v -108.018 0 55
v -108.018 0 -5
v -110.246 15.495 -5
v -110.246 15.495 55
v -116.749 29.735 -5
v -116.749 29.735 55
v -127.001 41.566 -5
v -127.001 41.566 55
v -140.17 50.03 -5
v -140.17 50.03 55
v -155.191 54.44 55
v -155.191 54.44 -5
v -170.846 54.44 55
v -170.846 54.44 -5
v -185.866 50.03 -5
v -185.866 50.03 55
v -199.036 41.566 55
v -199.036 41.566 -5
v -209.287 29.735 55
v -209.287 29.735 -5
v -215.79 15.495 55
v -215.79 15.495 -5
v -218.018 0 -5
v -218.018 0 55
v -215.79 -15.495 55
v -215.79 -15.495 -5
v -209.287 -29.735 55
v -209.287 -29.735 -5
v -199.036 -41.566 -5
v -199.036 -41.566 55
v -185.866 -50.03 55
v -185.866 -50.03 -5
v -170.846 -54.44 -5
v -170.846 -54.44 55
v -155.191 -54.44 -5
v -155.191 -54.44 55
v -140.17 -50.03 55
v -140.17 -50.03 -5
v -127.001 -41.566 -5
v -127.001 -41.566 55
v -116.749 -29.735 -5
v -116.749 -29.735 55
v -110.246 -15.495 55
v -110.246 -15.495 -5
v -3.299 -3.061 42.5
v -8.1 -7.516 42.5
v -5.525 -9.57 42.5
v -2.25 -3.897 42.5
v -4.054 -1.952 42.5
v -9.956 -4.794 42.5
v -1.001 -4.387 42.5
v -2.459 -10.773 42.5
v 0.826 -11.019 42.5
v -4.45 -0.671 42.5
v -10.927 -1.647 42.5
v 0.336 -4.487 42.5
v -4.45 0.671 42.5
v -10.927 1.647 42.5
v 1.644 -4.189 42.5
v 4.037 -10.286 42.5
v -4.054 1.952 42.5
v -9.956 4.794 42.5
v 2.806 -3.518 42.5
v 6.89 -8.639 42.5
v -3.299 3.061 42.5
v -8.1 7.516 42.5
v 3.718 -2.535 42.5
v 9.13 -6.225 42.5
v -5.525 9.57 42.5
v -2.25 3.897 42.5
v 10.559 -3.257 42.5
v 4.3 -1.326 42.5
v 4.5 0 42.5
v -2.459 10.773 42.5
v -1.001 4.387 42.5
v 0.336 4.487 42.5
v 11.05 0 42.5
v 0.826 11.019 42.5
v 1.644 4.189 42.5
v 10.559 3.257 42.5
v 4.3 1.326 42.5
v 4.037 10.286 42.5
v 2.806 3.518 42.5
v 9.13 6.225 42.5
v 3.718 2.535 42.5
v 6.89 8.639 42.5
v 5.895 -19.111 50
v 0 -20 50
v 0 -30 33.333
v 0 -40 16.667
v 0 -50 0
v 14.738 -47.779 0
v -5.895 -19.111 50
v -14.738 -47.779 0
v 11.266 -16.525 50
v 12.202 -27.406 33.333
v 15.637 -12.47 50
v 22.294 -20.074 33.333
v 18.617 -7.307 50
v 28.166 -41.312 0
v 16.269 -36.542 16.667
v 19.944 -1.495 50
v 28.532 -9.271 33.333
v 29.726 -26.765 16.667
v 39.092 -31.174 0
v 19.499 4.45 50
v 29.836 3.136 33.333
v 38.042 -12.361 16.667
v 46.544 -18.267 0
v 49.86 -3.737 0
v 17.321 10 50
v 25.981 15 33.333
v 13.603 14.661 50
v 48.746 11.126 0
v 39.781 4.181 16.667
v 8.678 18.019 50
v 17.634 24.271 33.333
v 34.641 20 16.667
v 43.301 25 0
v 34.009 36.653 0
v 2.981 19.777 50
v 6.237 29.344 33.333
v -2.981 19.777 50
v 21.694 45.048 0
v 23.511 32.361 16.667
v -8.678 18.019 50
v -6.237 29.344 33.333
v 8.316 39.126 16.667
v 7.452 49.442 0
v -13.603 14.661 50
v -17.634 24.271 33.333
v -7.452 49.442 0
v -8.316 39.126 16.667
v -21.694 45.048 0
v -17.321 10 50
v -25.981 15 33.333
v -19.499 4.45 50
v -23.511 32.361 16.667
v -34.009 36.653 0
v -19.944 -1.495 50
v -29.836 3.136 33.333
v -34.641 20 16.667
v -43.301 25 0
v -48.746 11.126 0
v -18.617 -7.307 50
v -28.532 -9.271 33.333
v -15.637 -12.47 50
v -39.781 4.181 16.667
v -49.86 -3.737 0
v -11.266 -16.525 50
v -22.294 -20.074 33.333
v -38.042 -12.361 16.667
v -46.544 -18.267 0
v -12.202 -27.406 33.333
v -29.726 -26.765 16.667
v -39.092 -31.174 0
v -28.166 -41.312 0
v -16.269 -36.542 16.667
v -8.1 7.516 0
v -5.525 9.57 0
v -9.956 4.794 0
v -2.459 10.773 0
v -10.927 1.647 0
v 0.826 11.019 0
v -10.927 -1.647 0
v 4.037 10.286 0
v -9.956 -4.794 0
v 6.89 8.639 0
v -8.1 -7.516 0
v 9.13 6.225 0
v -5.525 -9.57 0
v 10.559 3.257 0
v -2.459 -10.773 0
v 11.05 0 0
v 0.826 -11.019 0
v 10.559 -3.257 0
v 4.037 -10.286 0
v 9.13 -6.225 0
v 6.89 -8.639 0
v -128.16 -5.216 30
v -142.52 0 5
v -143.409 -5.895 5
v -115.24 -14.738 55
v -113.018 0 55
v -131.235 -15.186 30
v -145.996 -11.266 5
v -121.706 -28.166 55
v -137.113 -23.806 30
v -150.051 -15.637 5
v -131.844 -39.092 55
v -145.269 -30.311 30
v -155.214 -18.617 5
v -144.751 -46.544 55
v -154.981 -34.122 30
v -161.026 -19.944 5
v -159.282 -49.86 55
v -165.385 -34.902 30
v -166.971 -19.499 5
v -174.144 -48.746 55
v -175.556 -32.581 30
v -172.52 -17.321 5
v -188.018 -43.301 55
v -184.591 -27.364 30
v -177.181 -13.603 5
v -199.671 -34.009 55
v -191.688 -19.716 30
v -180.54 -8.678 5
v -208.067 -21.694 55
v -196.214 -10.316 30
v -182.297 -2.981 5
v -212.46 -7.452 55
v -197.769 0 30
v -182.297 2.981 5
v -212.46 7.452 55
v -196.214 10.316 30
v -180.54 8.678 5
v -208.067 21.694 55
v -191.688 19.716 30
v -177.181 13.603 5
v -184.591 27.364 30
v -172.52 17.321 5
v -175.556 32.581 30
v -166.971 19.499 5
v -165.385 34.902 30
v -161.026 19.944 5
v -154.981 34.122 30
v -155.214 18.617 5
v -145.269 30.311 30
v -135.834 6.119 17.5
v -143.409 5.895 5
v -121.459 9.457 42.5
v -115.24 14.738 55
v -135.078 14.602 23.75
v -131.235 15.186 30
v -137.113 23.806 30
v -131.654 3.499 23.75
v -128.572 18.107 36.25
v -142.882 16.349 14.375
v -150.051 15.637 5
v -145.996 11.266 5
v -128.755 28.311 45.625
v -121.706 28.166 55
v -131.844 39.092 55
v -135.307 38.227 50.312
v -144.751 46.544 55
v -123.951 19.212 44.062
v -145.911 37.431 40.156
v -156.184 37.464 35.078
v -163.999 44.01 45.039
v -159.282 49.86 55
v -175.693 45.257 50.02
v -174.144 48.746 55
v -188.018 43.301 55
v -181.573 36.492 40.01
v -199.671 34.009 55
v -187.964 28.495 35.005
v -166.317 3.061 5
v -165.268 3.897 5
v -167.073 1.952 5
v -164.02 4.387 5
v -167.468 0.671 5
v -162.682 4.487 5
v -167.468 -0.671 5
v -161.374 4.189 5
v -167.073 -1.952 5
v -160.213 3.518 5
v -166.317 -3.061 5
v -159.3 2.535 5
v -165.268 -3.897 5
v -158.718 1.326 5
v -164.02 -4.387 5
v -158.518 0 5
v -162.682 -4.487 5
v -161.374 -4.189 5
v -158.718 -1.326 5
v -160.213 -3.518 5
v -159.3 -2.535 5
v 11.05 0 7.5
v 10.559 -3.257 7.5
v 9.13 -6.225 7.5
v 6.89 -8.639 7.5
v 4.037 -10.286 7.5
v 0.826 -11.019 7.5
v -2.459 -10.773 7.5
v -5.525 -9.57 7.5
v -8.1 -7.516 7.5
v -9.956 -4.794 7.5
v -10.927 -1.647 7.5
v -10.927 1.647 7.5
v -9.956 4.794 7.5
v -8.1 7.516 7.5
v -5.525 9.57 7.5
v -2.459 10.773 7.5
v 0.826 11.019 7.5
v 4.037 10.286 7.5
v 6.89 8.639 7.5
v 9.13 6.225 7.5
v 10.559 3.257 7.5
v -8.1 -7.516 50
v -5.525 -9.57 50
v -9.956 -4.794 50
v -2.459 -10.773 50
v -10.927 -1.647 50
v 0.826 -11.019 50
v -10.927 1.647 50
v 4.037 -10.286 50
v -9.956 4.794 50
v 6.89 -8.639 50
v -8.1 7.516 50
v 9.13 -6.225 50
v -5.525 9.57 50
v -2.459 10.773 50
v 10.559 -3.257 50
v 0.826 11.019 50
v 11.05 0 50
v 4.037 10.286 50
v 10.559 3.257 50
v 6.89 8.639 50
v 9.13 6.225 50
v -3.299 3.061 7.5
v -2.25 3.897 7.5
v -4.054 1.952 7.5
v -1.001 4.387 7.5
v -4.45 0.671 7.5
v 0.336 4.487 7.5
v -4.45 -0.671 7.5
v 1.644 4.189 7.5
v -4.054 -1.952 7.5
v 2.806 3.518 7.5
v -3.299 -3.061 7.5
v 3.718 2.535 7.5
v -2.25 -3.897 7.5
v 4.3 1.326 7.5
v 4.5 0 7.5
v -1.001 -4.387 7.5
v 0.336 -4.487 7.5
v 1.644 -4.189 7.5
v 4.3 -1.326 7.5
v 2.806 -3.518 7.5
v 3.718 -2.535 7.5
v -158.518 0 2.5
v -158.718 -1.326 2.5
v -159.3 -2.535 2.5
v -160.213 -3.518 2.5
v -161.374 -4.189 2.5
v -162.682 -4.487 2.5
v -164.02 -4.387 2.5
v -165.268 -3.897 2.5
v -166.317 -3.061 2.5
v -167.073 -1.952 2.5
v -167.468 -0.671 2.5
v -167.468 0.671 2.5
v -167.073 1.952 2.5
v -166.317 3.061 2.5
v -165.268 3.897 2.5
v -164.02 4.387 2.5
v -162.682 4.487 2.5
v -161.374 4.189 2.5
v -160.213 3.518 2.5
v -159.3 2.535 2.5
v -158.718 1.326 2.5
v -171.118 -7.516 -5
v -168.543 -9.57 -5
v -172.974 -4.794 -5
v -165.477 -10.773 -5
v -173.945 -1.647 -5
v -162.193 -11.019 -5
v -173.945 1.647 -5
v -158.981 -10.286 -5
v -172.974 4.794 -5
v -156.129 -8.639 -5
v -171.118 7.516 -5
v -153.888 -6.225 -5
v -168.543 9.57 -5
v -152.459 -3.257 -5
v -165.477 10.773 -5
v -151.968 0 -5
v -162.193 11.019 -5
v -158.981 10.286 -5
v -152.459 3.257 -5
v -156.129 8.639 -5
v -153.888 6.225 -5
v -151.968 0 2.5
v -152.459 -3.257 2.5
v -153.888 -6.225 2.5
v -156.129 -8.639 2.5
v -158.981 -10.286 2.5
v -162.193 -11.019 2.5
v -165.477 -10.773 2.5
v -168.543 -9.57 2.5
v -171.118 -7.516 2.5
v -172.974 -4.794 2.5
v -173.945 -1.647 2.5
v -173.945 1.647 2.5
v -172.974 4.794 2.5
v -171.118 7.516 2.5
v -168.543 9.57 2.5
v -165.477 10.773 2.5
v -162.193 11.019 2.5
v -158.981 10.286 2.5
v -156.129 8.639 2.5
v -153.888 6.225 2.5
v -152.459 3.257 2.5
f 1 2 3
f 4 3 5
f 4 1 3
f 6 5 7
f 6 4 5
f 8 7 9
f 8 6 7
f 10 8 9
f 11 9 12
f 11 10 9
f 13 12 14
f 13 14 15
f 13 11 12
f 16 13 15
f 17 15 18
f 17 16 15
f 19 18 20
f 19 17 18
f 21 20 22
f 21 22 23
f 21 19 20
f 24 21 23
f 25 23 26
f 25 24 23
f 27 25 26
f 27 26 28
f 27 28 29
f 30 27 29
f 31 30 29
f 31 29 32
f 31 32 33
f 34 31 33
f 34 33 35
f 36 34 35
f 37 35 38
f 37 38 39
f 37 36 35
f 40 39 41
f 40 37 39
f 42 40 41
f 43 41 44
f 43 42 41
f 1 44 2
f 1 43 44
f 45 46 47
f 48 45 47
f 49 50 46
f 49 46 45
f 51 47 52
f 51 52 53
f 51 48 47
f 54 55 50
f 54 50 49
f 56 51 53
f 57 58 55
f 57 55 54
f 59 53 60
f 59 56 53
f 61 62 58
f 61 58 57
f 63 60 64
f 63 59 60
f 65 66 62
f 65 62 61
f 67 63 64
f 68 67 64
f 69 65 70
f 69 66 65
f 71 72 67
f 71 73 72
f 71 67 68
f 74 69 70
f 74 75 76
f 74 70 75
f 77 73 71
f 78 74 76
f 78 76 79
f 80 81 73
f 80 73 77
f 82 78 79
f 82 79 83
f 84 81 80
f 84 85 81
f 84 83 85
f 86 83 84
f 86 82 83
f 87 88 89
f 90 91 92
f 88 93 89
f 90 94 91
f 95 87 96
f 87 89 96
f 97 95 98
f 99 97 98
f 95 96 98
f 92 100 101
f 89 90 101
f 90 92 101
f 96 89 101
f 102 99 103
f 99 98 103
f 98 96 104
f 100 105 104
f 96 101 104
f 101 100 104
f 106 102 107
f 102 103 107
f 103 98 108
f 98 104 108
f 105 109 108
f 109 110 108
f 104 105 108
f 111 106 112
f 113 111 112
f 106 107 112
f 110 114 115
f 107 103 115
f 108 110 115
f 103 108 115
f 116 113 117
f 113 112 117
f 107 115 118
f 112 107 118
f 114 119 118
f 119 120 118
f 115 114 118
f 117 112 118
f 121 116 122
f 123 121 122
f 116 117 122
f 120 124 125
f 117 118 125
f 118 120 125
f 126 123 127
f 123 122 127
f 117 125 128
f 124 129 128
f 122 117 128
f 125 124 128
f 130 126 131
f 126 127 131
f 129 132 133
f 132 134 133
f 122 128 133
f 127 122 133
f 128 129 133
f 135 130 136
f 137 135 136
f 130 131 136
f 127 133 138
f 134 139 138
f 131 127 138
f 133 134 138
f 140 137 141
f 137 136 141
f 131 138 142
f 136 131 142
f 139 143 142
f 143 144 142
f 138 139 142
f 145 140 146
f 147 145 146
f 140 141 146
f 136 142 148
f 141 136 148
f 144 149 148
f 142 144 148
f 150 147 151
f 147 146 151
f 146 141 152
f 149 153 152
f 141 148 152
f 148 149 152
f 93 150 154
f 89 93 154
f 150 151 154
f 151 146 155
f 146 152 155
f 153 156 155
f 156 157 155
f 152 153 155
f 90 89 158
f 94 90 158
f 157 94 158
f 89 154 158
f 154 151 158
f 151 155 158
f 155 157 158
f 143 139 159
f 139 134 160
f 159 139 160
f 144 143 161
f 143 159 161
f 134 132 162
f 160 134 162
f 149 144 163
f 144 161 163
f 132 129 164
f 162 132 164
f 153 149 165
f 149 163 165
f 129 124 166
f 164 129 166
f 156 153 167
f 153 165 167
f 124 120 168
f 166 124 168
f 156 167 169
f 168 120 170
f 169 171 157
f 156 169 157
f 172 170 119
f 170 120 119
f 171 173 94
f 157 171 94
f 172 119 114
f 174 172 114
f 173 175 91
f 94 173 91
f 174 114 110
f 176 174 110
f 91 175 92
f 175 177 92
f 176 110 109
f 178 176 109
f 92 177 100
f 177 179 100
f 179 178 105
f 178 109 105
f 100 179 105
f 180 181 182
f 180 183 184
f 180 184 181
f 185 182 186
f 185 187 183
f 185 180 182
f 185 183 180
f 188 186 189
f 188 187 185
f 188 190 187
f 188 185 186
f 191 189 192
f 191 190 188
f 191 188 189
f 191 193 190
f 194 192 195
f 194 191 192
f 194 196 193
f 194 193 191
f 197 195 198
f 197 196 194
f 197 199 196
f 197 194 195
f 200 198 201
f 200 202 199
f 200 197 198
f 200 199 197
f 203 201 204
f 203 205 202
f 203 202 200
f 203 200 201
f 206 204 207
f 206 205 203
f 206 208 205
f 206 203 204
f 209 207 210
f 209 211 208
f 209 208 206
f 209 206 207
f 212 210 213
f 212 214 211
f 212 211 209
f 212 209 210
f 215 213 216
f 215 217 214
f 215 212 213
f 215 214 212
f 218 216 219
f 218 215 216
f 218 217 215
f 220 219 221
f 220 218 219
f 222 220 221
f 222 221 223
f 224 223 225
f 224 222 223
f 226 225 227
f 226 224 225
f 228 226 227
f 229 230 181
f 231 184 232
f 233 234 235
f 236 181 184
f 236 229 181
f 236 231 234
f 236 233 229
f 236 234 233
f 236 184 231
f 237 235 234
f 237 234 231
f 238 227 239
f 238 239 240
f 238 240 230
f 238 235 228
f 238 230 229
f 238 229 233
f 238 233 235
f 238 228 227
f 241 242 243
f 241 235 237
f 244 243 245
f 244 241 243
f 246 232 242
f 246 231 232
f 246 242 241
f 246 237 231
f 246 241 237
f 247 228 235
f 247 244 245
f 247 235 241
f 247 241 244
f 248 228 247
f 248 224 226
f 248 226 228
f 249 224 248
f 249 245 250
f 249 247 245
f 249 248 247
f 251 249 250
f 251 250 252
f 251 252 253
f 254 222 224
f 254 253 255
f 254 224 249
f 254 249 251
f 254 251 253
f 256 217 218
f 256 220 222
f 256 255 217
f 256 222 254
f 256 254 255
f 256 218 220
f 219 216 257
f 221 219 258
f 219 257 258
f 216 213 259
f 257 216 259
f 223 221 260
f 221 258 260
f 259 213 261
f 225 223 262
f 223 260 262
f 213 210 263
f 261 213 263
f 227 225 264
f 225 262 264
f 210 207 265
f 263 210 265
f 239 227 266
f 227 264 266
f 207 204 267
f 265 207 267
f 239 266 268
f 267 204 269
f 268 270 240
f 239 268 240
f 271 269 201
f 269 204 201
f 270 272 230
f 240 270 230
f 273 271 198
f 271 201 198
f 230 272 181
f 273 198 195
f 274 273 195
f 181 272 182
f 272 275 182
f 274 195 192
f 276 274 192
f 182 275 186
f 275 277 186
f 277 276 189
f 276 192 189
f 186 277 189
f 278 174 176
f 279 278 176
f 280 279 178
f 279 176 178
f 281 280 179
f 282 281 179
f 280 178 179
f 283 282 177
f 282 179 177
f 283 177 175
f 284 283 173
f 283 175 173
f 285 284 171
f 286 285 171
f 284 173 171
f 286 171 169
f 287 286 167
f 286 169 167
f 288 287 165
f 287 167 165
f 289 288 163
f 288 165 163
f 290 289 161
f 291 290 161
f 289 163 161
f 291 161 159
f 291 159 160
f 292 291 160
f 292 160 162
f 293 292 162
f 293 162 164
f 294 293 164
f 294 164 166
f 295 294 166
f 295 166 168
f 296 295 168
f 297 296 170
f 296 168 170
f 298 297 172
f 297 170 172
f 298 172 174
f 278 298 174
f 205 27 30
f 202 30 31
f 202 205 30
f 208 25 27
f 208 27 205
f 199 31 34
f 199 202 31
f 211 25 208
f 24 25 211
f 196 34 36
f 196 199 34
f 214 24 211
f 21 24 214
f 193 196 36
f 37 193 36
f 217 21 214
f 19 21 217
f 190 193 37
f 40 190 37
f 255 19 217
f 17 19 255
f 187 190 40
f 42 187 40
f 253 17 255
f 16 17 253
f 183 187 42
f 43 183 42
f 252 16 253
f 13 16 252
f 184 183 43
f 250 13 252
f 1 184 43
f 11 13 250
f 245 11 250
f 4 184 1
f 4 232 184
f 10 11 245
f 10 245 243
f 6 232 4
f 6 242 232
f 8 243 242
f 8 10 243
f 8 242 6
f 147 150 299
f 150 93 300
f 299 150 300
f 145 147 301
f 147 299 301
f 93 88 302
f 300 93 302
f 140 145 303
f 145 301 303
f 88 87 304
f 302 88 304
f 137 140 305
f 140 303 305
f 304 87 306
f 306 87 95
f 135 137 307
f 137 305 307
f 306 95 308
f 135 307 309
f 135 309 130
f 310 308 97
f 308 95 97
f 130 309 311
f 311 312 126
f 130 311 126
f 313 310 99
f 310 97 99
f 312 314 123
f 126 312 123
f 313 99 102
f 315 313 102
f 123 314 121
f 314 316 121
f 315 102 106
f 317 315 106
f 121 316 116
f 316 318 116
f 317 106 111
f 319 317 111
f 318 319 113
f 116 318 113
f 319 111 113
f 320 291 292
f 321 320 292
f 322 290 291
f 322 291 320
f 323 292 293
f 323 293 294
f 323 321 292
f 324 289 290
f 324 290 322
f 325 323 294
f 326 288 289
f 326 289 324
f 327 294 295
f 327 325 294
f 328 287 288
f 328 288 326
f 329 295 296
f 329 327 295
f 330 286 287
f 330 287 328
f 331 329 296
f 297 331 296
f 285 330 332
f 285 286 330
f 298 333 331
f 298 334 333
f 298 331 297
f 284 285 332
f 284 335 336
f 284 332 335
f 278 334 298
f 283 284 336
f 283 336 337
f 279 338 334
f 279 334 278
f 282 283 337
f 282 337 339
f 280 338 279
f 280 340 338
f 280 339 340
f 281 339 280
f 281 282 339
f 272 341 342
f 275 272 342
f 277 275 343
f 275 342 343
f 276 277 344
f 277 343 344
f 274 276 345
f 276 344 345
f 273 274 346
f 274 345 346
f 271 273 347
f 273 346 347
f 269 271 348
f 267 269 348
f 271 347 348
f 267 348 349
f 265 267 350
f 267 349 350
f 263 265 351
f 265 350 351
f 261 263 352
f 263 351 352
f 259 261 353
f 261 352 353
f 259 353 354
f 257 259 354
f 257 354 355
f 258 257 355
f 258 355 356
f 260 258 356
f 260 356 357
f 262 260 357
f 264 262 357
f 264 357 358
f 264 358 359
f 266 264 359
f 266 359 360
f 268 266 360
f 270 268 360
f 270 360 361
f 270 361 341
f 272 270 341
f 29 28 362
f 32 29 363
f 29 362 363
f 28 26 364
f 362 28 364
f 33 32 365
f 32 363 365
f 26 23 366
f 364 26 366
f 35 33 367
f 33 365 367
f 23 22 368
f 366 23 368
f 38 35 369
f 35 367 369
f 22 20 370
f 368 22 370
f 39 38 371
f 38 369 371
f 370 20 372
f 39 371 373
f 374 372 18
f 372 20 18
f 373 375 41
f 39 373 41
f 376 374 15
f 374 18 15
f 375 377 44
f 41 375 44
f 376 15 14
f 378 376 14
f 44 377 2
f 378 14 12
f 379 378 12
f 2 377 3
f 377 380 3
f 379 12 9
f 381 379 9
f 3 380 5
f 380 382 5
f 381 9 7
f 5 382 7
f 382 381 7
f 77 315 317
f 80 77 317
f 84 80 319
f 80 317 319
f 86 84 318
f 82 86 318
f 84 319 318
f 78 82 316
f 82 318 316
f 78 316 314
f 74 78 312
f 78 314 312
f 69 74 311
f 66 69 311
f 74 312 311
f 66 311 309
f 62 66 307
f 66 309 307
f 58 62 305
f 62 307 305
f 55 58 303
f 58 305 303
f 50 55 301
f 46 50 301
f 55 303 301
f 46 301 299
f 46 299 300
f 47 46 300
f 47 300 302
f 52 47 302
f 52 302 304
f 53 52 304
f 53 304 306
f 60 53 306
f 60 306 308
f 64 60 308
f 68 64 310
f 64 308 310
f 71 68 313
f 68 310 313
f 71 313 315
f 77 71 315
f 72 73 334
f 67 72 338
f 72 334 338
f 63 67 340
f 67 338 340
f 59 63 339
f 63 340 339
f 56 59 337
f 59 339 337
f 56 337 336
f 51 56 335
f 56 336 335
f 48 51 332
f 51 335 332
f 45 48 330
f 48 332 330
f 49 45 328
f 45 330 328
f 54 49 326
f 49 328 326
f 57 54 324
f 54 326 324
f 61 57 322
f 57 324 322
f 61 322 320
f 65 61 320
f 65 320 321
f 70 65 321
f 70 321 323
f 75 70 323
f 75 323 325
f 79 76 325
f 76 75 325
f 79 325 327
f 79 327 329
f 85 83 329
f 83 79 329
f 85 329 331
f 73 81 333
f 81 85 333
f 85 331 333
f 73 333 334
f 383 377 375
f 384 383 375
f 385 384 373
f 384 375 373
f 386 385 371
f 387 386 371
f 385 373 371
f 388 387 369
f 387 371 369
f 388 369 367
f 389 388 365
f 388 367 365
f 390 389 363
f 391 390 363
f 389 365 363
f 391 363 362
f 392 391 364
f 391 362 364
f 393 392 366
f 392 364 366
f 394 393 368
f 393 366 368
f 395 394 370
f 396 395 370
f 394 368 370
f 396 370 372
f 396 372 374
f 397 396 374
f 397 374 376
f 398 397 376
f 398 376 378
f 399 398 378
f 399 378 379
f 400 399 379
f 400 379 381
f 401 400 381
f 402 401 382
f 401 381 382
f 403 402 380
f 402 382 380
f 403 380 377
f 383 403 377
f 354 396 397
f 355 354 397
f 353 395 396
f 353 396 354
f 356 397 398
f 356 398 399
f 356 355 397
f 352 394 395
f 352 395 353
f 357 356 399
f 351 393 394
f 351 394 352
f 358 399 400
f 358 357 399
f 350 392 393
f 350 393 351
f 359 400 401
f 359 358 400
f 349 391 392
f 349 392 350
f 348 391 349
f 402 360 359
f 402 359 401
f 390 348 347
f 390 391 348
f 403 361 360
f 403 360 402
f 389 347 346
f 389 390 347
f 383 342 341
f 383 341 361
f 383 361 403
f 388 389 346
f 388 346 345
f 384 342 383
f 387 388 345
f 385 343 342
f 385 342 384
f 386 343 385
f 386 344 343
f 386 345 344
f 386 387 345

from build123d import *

# Parameters (mm, degrees)
F2_R      = 4.5
F3_DEPTH  = 50.001
F2_R_2    = 11.05
F4_DEPTH  = 7.5
F5_R      = 11.05
F5_R_2    = 4.5
F6_DEPTH  = 7.5
F7_R      = 55
F8_DEPTH  = 55
F11_R     = 20
F9_R      = 50
F13_DEPTH = 5
F14_R     = 4.5
F15_DEPTH = 60.0010001
F14_R_2   = 11.05
F16_DEPTH = 7.5


with BuildPart() as f1:
    # F0 (on Right) → F1 (revolve)
    with BuildSketch(Plane.YZ):
        Polygon((-50, 0), (0, 0), (0, 50), (-20, 50), align=None)
    revolve(axis=Axis((0, 0, 12.6269906759), (0, 0, 1)))

    # F2 (on face) → F3 (cut, through all)
    with BuildSketch(Plane(origin=(0, 0, 0), x_dir=(1, 0, 0), z_dir=(0, 0, -1))):
        Circle(F2_R)
    extrude(amount=-F3_DEPTH, mode=Mode.SUBTRACT)

    # F2 (on face) → F4 (cut)
    with BuildSketch(Plane(origin=(0, 0, 0), x_dir=(1, 0, 0), z_dir=(0, 0, -1))):
        Circle(F2_R_2)
        Circle(F2_R, mode=Mode.SUBTRACT)
    extrude(amount=-F4_DEPTH, mode=Mode.SUBTRACT)

    # F5 (on face) → F6 (cut)
    with BuildSketch(Plane.XY.offset(50)):
        Circle(F5_R)
        Circle(F5_R_2, mode=Mode.SUBTRACT)
    extrude(amount=-F6_DEPTH, mode=Mode.SUBTRACT)


with BuildPart() as f8:
    # F7 (on Top) → F8 (new body)
    with BuildSketch(Plane.XY):
        with Locations((-163.0182683468, 0)):
            Circle(F7_R)
    extrude(amount=F8_DEPTH)

    # F11 (on offset) → F12 section 0
    with BuildSketch(Plane(origin=(0, 0, 5), x_dir=(1, 0, 0), z_dir=(0, 0, -1))):
        with Locations((-162.5203639269, 0)):
            Circle(F11_R)
    # F9 (on face) → F12 section 1
    with BuildSketch(Plane.XY.offset(55)):
        with Locations((-163.0182683468, 0)):
            Circle(F9_R)
    loft(mode=Mode.SUBTRACT)

    # F13 (add): a face of the model
    f13_faces = [f8.faces().sort_by_distance(p)[0] for p in [
        (-163.0182683468, 0, 0),
    ]]
    extrude(f13_faces, amount=F13_DEPTH)

    # F14 (on face) → F15 (cut, through all)
    with BuildSketch(Plane(origin=(0, 0, -5), x_dir=(1, 0, 0), z_dir=(0, 0, -1))):
        with Locations((-163.0182683468, 0)):
            Circle(F14_R)
    extrude(amount=-F15_DEPTH, mode=Mode.SUBTRACT)

    # F14 (on face) → F16 (cut)
    with BuildSketch(Plane(origin=(0, 0, -5), x_dir=(1, 0, 0), z_dir=(0, 0, -1))):
        with Locations((-163.0182683468, 0)):
            Circle(F14_R_2)
        with Locations((-163.0182683468, 0)):
            Circle(F14_R, mode=Mode.SUBTRACT)
    extrude(amount=-F16_DEPTH, mode=Mode.SUBTRACT)


solid = Compound([f1.part, f8.part])
